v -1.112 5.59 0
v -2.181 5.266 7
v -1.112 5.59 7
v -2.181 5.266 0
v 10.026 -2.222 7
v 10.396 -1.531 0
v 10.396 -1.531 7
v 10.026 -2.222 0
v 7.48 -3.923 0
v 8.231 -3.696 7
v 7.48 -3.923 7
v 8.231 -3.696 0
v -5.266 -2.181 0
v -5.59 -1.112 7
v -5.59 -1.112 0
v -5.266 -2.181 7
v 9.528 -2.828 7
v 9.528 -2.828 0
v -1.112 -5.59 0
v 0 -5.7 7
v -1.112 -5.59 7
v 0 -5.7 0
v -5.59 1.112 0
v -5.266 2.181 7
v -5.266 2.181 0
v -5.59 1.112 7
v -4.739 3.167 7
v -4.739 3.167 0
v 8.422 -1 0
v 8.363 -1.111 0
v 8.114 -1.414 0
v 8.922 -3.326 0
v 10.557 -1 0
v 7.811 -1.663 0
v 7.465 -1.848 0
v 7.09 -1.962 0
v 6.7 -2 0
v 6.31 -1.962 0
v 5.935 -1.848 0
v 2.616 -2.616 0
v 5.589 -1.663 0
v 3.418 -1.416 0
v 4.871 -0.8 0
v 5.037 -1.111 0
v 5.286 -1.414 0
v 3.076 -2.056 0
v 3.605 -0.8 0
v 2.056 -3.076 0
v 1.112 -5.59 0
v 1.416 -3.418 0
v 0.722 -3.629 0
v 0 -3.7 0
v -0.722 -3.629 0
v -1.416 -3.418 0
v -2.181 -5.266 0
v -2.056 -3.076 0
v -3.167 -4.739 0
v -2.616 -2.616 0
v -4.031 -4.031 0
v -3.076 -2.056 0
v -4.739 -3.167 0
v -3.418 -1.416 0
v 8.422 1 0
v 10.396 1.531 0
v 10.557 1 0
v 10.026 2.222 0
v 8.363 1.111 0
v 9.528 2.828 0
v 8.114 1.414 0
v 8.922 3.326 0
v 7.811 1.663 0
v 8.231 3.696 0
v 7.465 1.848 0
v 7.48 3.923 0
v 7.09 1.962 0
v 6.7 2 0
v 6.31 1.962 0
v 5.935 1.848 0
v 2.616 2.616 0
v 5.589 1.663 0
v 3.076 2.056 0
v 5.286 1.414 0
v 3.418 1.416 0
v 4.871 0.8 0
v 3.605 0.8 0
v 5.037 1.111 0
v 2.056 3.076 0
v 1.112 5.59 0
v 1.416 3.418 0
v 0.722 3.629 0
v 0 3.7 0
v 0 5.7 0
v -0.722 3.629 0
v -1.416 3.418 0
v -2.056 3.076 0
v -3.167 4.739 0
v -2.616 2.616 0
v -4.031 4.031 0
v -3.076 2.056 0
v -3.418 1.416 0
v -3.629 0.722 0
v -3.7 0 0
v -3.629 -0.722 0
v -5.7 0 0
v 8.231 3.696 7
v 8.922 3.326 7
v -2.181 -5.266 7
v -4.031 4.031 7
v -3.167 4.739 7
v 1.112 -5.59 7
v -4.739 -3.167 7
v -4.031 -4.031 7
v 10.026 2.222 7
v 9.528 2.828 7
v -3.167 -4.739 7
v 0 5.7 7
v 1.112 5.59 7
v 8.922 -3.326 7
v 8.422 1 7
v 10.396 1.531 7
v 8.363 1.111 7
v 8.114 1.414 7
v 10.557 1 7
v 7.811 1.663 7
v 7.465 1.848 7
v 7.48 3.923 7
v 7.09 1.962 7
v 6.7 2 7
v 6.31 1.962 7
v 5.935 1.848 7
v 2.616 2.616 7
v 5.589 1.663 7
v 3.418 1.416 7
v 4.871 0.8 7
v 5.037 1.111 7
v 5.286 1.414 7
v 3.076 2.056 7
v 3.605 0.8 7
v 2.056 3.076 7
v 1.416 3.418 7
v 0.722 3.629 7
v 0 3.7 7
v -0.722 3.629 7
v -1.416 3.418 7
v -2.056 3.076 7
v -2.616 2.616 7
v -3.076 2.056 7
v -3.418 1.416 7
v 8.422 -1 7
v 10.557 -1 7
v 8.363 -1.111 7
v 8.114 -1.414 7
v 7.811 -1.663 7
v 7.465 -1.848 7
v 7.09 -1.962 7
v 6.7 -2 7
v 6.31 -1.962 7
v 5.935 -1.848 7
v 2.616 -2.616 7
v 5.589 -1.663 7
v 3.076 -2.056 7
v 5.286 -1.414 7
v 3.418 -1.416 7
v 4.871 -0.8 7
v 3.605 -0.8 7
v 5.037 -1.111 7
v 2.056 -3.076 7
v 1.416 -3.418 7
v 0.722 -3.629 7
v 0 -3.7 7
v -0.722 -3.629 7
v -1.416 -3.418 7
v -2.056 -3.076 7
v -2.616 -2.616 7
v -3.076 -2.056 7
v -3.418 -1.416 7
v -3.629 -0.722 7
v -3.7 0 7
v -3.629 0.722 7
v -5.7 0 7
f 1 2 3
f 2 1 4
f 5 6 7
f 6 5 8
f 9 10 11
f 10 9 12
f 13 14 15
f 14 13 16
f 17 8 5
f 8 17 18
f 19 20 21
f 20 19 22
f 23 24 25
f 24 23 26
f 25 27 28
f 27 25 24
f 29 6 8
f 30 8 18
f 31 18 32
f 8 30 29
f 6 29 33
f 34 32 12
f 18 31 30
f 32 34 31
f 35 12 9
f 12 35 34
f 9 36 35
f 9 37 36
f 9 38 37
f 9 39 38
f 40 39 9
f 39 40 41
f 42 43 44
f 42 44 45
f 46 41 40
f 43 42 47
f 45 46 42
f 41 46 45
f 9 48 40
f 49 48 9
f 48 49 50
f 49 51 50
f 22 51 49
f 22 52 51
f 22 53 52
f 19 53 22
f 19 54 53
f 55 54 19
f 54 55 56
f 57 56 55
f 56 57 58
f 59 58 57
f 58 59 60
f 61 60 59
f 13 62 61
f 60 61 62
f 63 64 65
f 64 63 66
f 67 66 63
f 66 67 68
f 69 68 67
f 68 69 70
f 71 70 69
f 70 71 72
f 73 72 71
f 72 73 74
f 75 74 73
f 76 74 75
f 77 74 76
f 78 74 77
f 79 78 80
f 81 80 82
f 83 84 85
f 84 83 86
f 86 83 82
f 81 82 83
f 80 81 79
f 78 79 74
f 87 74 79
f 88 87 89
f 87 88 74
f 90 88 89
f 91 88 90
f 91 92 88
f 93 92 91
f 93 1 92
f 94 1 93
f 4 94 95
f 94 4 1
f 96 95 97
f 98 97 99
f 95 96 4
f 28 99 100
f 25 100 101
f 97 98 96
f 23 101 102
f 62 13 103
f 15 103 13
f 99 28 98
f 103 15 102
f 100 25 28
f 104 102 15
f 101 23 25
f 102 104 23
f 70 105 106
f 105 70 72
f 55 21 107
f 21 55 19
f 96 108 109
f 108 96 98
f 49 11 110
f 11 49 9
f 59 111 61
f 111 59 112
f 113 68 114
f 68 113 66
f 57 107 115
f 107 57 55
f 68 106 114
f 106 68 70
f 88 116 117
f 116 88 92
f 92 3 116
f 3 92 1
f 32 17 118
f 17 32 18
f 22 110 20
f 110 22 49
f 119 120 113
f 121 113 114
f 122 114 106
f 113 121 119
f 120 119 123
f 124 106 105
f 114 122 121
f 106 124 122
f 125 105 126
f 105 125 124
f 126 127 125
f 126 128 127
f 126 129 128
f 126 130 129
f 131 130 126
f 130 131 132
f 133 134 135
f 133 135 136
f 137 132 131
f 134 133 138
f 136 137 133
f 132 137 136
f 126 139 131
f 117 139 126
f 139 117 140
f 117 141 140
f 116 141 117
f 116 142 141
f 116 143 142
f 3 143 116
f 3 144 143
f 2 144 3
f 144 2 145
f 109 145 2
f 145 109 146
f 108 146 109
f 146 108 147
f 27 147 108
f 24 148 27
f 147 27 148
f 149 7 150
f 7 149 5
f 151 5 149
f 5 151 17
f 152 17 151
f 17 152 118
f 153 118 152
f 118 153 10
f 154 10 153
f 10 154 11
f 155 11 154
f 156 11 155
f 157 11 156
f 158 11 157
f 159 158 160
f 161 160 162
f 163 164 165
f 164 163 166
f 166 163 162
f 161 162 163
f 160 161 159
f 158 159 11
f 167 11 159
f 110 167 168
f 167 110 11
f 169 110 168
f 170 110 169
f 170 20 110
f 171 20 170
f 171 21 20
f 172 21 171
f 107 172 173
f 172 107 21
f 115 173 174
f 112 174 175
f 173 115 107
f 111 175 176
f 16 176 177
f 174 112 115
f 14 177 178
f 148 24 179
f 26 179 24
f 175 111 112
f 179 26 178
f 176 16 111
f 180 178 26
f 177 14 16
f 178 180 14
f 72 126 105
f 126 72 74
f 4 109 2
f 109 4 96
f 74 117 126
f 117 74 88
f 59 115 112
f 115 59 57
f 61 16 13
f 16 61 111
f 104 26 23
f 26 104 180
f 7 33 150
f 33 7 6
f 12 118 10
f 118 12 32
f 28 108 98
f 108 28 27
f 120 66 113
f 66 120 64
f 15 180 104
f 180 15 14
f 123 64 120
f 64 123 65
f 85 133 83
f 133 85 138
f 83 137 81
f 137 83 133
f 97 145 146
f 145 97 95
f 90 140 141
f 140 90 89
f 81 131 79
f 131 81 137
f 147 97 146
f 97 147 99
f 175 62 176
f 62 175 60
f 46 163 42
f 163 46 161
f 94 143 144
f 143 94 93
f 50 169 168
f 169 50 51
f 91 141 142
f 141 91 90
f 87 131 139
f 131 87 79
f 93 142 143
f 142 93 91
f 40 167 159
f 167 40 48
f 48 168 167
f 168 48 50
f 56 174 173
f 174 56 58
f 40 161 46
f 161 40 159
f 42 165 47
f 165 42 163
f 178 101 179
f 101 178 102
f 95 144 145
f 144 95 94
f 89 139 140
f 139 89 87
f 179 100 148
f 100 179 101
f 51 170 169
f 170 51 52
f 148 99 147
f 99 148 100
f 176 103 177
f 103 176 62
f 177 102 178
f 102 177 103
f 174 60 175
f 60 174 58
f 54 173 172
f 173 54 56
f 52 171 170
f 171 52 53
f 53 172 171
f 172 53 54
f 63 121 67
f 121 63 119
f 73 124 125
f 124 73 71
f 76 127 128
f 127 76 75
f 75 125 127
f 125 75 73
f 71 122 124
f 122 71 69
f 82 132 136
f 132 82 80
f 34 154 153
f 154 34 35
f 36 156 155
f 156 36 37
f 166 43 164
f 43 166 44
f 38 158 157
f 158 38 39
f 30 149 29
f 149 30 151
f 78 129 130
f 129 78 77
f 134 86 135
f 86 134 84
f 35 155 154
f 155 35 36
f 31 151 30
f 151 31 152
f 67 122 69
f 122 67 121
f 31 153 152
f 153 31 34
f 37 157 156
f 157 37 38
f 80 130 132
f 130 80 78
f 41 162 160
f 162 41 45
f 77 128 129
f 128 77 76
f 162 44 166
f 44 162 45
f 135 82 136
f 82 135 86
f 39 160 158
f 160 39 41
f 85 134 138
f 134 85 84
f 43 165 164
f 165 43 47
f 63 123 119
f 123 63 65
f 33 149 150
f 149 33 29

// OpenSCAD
/* Bowden tube wire clips
 *
 * Used for holding wires against a Bowden tube. These clips are easier to
 * remove/replace than kapton tape! Printing considerations:
 *
 *   * 100% infill
 *
 *   * print more than one at once to avoid the need for cooling (move to
 *     opposite corners of your bed)
 *
 *   * choose your extrusion width so that `clip_width` is a multiple of it
 *
 * Author: Alex Hirzel <alex@hirzel.us>
 * License: BSD
 * Thingiverse: <http://www.thingiverse.com/thing:661426>
 * YouMagine: <https://www.youmagine.com/designs/bowden-tube-wire-clip>
 */


/* [Sizing] */

// (mm)
bowden_tube_diameter = 4;

// (mm)
cable_diameter = 7.4;

// - desired width of clip along the tube/wires (mm)
clip_width = 7;


/* [Strength] */

// - minimum thickness of any part of the clip (mm)
clip_thickness = 2;


/* [Hidden] */

// - gap between the tube and wires (mm)
middle_thing_width = 1;

// - lots of resolution
$fn = 32;

/* END PARAMETERS */



// computed for later
c2c_distance = (bowden_tube_diameter + cable_diameter)/2 + middle_thing_width;
inner_gap_width = 0.4*min(bowden_tube_diameter, cable_diameter);
bowden_gap_width = 0.5*bowden_tube_diameter;



difference() {

	// build the outside edge of the clip
	hull() {

		// cylinder around cables
		cylinder(d = cable_diameter + 2*clip_thickness,
		         h = clip_width, $fa = 1);

		// cylinder around bowden tube
		other() cylinder(d = bowden_tube_diameter + 2*clip_thickness,
		                 h = clip_width);
	}

	// subtract volume for cables
	cylinder(d = cable_diameter, h = clip_width);

	// subtract volume for bowden tube
	other() cylinder(d = bowden_tube_diameter, h = clip_width);

	// subtract a path between the two
	translate([0, -inner_gap_width/2, 0])
		cube([c2c_distance, inner_gap_width, clip_width]);

	// finally, subtract the "entrance hole" for the whole thing
	translate([0, -bowden_gap_width/2, 0])
		other() cube([c2c_distance, bowden_gap_width, clip_width]);
}

module other() {
	translate([c2c_distance, 0, 0])
		children();
}
